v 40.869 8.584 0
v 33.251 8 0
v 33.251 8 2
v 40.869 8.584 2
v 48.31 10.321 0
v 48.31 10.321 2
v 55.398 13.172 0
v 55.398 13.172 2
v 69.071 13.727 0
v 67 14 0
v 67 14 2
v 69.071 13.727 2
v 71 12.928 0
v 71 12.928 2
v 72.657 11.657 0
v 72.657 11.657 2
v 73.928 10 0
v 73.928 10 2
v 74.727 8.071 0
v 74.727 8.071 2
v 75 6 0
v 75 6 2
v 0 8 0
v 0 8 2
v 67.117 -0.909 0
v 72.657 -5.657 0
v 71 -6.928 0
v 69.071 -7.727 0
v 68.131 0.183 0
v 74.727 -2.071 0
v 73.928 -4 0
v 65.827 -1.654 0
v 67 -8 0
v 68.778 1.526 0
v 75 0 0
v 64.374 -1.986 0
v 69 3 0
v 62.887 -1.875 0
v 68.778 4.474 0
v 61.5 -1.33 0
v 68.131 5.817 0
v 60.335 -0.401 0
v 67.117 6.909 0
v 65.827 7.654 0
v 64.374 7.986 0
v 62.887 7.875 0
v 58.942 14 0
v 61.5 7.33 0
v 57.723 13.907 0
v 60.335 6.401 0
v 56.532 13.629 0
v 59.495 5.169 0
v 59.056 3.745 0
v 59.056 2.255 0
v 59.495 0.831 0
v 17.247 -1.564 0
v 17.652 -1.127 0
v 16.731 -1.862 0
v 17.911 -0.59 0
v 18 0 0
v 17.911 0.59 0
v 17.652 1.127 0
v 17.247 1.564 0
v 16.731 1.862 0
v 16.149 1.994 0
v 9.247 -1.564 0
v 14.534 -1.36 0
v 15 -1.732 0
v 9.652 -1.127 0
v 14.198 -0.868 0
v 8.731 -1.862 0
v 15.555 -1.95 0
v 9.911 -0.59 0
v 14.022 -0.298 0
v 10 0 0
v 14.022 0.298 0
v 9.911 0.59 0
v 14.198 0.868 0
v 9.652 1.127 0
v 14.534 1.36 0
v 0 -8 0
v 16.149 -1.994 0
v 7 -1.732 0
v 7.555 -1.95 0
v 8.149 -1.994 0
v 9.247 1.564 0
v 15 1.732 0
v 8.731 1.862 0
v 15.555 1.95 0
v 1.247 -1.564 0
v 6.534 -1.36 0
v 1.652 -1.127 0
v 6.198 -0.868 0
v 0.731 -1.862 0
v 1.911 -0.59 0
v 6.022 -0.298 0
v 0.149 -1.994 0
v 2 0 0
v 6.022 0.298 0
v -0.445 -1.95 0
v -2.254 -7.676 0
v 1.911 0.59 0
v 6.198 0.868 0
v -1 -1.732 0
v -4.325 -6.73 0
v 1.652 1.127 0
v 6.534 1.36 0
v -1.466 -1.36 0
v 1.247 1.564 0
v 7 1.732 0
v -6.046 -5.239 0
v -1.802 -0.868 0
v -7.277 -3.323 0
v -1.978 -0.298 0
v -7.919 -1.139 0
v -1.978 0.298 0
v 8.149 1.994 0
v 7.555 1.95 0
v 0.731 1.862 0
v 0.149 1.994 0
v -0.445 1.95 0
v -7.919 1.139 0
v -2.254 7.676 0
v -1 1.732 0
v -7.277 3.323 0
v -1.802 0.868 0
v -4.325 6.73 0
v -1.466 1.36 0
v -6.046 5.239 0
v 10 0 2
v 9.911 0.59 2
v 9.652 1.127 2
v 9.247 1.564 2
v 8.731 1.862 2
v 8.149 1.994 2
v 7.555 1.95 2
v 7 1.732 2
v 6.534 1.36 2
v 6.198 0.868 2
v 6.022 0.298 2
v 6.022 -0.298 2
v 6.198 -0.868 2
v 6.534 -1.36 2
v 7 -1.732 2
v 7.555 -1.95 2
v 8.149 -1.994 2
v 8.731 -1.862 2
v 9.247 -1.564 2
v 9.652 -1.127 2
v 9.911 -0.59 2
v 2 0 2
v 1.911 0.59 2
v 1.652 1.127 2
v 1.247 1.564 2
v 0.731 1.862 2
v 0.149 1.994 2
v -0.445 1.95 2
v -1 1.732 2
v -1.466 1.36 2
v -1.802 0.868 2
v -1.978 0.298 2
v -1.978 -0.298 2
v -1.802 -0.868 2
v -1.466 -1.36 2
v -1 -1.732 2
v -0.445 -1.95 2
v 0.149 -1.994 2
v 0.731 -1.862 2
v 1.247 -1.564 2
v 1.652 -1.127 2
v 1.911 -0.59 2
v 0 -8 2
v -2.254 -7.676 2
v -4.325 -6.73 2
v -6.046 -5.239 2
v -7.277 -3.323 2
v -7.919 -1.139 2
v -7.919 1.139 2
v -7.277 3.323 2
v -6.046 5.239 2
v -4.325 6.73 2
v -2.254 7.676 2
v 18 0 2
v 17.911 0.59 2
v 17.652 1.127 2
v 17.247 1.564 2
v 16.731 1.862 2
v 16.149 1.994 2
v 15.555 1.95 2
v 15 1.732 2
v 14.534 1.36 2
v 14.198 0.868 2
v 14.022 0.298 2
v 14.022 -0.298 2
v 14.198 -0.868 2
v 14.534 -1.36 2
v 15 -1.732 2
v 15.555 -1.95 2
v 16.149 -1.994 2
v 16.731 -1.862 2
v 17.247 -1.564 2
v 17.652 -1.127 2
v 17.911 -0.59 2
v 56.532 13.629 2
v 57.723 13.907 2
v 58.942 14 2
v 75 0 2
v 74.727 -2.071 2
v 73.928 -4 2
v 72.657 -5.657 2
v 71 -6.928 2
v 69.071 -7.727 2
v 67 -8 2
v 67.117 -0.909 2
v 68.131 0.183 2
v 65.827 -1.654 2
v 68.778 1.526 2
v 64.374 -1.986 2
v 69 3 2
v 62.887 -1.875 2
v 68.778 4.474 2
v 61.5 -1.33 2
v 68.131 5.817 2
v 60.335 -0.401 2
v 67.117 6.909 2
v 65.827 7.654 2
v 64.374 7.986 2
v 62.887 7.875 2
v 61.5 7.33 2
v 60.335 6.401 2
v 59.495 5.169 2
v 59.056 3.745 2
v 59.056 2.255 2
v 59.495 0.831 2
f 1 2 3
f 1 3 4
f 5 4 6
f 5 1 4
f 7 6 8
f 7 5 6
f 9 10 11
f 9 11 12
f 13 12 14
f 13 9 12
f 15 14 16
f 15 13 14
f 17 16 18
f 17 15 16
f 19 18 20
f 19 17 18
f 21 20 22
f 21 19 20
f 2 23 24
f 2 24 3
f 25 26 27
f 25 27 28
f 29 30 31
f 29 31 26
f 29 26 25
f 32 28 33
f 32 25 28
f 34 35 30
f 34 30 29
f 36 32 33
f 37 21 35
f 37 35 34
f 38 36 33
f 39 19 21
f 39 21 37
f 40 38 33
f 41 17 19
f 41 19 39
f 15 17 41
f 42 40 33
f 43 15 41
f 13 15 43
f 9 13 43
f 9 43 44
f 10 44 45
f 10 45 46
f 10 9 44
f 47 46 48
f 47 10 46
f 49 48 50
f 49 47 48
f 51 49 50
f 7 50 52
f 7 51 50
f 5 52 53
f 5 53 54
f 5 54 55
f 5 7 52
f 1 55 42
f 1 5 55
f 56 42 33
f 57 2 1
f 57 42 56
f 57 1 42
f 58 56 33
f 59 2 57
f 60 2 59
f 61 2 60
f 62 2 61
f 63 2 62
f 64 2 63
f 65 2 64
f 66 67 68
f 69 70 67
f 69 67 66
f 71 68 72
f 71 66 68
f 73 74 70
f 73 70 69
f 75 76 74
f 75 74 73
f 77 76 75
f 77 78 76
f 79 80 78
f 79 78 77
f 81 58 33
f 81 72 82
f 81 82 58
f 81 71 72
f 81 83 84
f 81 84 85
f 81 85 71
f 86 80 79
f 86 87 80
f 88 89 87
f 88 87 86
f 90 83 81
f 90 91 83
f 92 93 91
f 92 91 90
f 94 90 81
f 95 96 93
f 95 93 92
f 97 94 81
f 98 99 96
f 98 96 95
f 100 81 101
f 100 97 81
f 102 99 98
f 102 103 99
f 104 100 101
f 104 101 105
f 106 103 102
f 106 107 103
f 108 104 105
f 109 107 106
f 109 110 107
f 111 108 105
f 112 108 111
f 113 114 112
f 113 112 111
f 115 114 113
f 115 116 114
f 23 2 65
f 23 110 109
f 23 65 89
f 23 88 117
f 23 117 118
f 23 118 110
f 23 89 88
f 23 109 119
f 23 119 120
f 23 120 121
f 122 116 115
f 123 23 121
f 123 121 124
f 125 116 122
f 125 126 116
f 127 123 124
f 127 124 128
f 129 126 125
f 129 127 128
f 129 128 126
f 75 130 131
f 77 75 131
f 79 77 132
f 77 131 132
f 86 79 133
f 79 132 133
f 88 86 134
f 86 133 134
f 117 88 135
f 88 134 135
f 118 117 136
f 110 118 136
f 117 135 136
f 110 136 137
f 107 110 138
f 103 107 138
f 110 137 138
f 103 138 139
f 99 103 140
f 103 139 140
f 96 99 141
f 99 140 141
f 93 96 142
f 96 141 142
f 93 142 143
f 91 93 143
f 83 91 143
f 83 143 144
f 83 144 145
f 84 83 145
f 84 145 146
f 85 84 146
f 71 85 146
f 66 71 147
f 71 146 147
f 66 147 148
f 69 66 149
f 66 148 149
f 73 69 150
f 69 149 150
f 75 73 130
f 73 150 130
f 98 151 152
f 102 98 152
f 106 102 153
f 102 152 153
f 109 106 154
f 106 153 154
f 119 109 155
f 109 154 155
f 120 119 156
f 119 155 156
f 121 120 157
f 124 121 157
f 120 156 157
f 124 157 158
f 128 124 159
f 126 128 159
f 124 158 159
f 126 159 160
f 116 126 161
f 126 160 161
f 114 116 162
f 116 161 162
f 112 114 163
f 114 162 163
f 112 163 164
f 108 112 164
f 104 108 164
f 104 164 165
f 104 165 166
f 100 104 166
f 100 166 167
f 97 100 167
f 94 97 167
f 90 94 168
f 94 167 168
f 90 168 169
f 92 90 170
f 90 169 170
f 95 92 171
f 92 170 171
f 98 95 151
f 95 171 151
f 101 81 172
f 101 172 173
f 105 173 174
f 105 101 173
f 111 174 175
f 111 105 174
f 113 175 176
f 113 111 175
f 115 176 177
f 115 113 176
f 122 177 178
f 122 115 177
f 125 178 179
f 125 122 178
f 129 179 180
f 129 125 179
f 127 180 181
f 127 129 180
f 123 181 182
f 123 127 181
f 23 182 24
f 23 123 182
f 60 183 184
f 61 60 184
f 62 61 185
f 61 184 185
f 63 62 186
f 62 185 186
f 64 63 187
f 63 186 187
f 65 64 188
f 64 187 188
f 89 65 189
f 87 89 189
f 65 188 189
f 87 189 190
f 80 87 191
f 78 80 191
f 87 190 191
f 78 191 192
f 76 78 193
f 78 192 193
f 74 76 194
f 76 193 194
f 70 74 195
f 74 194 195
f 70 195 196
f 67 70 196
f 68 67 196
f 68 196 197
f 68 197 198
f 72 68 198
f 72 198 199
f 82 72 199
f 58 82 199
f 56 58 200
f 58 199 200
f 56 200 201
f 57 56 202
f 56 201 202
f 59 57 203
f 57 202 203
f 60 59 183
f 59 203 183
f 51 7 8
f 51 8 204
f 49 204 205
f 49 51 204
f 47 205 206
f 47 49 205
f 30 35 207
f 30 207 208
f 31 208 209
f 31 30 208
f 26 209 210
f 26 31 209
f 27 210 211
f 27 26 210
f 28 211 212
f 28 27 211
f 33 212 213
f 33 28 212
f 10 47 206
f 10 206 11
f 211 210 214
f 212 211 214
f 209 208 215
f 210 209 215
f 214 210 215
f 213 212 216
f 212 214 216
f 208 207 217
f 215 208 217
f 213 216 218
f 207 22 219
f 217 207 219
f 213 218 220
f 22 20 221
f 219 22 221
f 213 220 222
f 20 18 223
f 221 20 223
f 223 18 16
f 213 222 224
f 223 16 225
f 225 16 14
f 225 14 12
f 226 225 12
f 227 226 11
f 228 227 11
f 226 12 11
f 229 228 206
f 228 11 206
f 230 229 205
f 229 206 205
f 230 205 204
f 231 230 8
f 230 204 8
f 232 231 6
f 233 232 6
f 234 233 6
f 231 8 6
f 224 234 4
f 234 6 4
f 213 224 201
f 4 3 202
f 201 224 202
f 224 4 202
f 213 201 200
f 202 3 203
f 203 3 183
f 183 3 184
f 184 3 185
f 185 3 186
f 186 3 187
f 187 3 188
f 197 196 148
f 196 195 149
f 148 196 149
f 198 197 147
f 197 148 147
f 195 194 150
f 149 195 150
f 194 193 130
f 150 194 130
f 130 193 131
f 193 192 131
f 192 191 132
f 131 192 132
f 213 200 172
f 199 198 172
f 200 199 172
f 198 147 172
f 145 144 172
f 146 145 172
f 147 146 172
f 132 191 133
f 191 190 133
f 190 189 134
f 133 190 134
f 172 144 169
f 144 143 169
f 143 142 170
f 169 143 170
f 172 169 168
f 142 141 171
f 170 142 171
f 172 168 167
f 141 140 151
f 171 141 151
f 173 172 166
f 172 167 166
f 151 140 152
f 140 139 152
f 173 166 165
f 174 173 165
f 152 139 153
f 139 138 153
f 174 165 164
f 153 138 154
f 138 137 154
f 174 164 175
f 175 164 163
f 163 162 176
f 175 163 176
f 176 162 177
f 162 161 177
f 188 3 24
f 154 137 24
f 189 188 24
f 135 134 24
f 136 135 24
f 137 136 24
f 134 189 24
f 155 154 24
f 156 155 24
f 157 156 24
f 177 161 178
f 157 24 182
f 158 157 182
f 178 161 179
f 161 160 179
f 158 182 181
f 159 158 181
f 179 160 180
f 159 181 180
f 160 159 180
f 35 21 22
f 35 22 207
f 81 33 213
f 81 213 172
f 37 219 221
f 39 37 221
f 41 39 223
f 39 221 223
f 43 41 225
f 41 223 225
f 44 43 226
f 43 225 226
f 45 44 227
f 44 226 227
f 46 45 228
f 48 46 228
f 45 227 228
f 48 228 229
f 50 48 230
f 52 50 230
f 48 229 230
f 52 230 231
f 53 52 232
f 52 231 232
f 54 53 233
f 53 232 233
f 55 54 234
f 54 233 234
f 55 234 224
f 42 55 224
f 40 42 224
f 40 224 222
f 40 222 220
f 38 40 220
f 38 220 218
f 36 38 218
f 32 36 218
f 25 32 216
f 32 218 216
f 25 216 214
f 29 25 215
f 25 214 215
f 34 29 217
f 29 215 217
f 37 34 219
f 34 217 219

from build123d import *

# Parameters (mm, degrees)
BOSS_EXTRUDE1_DEPTH = 2
SKETCH2_R           = 2
CUT_EXTRUDE1_DEPTH  = 2
SKETCH3_R           = 5
CUT_EXTRUDE2_DEPTH  = 2


with BuildPart() as part:
    # Sketch1 → Boss-Extrude1 (new body)
    with BuildSketch(Plane.XY):
        with BuildLine():
            Line((0, 8), (33.251315826, 8))
            ThreePointArc((33.251315826, 8), (44.62278648, 9.310271564), (55.398268548, 13.172413793))
            ThreePointArc((55.398268548, 13.172413793), (57.122345679, 13.79035655), (58.941780983, 14))
            Line((58.941780983, 14), (67, 14))
            ThreePointArc((67, 14), (72.656854249, 11.656854249), (75, 6))
            Line((75, 6), (75, 0))
            ThreePointArc((75, 0), (72.656854249, -5.656854249), (67, -8))
            Line((67, -8), (0, -8))
            ThreePointArc((0, -8), (-8, 0), (0, 8))
        make_face()
    extrude(amount=BOSS_EXTRUDE1_DEPTH)

    # Sketch2 → Cut-Extrude1 (cut)
    with BuildSketch(Plane.XY.offset(2)):
        Circle(SKETCH2_R)
        with Locations((8, 0)):
            Circle(SKETCH2_R)
        with Locations((16, 0)):
            Circle(SKETCH2_R)
    extrude(amount=-CUT_EXTRUDE1_DEPTH, mode=Mode.SUBTRACT)

    # Sketch3 → Cut-Extrude2 (cut)
    with BuildSketch(Plane.XY.offset(2)):
        with Locations((64, 3)):
            Circle(SKETCH3_R)
    extrude(amount=-CUT_EXTRUDE2_DEPTH, mode=Mode.SUBTRACT)


solid = part.part
